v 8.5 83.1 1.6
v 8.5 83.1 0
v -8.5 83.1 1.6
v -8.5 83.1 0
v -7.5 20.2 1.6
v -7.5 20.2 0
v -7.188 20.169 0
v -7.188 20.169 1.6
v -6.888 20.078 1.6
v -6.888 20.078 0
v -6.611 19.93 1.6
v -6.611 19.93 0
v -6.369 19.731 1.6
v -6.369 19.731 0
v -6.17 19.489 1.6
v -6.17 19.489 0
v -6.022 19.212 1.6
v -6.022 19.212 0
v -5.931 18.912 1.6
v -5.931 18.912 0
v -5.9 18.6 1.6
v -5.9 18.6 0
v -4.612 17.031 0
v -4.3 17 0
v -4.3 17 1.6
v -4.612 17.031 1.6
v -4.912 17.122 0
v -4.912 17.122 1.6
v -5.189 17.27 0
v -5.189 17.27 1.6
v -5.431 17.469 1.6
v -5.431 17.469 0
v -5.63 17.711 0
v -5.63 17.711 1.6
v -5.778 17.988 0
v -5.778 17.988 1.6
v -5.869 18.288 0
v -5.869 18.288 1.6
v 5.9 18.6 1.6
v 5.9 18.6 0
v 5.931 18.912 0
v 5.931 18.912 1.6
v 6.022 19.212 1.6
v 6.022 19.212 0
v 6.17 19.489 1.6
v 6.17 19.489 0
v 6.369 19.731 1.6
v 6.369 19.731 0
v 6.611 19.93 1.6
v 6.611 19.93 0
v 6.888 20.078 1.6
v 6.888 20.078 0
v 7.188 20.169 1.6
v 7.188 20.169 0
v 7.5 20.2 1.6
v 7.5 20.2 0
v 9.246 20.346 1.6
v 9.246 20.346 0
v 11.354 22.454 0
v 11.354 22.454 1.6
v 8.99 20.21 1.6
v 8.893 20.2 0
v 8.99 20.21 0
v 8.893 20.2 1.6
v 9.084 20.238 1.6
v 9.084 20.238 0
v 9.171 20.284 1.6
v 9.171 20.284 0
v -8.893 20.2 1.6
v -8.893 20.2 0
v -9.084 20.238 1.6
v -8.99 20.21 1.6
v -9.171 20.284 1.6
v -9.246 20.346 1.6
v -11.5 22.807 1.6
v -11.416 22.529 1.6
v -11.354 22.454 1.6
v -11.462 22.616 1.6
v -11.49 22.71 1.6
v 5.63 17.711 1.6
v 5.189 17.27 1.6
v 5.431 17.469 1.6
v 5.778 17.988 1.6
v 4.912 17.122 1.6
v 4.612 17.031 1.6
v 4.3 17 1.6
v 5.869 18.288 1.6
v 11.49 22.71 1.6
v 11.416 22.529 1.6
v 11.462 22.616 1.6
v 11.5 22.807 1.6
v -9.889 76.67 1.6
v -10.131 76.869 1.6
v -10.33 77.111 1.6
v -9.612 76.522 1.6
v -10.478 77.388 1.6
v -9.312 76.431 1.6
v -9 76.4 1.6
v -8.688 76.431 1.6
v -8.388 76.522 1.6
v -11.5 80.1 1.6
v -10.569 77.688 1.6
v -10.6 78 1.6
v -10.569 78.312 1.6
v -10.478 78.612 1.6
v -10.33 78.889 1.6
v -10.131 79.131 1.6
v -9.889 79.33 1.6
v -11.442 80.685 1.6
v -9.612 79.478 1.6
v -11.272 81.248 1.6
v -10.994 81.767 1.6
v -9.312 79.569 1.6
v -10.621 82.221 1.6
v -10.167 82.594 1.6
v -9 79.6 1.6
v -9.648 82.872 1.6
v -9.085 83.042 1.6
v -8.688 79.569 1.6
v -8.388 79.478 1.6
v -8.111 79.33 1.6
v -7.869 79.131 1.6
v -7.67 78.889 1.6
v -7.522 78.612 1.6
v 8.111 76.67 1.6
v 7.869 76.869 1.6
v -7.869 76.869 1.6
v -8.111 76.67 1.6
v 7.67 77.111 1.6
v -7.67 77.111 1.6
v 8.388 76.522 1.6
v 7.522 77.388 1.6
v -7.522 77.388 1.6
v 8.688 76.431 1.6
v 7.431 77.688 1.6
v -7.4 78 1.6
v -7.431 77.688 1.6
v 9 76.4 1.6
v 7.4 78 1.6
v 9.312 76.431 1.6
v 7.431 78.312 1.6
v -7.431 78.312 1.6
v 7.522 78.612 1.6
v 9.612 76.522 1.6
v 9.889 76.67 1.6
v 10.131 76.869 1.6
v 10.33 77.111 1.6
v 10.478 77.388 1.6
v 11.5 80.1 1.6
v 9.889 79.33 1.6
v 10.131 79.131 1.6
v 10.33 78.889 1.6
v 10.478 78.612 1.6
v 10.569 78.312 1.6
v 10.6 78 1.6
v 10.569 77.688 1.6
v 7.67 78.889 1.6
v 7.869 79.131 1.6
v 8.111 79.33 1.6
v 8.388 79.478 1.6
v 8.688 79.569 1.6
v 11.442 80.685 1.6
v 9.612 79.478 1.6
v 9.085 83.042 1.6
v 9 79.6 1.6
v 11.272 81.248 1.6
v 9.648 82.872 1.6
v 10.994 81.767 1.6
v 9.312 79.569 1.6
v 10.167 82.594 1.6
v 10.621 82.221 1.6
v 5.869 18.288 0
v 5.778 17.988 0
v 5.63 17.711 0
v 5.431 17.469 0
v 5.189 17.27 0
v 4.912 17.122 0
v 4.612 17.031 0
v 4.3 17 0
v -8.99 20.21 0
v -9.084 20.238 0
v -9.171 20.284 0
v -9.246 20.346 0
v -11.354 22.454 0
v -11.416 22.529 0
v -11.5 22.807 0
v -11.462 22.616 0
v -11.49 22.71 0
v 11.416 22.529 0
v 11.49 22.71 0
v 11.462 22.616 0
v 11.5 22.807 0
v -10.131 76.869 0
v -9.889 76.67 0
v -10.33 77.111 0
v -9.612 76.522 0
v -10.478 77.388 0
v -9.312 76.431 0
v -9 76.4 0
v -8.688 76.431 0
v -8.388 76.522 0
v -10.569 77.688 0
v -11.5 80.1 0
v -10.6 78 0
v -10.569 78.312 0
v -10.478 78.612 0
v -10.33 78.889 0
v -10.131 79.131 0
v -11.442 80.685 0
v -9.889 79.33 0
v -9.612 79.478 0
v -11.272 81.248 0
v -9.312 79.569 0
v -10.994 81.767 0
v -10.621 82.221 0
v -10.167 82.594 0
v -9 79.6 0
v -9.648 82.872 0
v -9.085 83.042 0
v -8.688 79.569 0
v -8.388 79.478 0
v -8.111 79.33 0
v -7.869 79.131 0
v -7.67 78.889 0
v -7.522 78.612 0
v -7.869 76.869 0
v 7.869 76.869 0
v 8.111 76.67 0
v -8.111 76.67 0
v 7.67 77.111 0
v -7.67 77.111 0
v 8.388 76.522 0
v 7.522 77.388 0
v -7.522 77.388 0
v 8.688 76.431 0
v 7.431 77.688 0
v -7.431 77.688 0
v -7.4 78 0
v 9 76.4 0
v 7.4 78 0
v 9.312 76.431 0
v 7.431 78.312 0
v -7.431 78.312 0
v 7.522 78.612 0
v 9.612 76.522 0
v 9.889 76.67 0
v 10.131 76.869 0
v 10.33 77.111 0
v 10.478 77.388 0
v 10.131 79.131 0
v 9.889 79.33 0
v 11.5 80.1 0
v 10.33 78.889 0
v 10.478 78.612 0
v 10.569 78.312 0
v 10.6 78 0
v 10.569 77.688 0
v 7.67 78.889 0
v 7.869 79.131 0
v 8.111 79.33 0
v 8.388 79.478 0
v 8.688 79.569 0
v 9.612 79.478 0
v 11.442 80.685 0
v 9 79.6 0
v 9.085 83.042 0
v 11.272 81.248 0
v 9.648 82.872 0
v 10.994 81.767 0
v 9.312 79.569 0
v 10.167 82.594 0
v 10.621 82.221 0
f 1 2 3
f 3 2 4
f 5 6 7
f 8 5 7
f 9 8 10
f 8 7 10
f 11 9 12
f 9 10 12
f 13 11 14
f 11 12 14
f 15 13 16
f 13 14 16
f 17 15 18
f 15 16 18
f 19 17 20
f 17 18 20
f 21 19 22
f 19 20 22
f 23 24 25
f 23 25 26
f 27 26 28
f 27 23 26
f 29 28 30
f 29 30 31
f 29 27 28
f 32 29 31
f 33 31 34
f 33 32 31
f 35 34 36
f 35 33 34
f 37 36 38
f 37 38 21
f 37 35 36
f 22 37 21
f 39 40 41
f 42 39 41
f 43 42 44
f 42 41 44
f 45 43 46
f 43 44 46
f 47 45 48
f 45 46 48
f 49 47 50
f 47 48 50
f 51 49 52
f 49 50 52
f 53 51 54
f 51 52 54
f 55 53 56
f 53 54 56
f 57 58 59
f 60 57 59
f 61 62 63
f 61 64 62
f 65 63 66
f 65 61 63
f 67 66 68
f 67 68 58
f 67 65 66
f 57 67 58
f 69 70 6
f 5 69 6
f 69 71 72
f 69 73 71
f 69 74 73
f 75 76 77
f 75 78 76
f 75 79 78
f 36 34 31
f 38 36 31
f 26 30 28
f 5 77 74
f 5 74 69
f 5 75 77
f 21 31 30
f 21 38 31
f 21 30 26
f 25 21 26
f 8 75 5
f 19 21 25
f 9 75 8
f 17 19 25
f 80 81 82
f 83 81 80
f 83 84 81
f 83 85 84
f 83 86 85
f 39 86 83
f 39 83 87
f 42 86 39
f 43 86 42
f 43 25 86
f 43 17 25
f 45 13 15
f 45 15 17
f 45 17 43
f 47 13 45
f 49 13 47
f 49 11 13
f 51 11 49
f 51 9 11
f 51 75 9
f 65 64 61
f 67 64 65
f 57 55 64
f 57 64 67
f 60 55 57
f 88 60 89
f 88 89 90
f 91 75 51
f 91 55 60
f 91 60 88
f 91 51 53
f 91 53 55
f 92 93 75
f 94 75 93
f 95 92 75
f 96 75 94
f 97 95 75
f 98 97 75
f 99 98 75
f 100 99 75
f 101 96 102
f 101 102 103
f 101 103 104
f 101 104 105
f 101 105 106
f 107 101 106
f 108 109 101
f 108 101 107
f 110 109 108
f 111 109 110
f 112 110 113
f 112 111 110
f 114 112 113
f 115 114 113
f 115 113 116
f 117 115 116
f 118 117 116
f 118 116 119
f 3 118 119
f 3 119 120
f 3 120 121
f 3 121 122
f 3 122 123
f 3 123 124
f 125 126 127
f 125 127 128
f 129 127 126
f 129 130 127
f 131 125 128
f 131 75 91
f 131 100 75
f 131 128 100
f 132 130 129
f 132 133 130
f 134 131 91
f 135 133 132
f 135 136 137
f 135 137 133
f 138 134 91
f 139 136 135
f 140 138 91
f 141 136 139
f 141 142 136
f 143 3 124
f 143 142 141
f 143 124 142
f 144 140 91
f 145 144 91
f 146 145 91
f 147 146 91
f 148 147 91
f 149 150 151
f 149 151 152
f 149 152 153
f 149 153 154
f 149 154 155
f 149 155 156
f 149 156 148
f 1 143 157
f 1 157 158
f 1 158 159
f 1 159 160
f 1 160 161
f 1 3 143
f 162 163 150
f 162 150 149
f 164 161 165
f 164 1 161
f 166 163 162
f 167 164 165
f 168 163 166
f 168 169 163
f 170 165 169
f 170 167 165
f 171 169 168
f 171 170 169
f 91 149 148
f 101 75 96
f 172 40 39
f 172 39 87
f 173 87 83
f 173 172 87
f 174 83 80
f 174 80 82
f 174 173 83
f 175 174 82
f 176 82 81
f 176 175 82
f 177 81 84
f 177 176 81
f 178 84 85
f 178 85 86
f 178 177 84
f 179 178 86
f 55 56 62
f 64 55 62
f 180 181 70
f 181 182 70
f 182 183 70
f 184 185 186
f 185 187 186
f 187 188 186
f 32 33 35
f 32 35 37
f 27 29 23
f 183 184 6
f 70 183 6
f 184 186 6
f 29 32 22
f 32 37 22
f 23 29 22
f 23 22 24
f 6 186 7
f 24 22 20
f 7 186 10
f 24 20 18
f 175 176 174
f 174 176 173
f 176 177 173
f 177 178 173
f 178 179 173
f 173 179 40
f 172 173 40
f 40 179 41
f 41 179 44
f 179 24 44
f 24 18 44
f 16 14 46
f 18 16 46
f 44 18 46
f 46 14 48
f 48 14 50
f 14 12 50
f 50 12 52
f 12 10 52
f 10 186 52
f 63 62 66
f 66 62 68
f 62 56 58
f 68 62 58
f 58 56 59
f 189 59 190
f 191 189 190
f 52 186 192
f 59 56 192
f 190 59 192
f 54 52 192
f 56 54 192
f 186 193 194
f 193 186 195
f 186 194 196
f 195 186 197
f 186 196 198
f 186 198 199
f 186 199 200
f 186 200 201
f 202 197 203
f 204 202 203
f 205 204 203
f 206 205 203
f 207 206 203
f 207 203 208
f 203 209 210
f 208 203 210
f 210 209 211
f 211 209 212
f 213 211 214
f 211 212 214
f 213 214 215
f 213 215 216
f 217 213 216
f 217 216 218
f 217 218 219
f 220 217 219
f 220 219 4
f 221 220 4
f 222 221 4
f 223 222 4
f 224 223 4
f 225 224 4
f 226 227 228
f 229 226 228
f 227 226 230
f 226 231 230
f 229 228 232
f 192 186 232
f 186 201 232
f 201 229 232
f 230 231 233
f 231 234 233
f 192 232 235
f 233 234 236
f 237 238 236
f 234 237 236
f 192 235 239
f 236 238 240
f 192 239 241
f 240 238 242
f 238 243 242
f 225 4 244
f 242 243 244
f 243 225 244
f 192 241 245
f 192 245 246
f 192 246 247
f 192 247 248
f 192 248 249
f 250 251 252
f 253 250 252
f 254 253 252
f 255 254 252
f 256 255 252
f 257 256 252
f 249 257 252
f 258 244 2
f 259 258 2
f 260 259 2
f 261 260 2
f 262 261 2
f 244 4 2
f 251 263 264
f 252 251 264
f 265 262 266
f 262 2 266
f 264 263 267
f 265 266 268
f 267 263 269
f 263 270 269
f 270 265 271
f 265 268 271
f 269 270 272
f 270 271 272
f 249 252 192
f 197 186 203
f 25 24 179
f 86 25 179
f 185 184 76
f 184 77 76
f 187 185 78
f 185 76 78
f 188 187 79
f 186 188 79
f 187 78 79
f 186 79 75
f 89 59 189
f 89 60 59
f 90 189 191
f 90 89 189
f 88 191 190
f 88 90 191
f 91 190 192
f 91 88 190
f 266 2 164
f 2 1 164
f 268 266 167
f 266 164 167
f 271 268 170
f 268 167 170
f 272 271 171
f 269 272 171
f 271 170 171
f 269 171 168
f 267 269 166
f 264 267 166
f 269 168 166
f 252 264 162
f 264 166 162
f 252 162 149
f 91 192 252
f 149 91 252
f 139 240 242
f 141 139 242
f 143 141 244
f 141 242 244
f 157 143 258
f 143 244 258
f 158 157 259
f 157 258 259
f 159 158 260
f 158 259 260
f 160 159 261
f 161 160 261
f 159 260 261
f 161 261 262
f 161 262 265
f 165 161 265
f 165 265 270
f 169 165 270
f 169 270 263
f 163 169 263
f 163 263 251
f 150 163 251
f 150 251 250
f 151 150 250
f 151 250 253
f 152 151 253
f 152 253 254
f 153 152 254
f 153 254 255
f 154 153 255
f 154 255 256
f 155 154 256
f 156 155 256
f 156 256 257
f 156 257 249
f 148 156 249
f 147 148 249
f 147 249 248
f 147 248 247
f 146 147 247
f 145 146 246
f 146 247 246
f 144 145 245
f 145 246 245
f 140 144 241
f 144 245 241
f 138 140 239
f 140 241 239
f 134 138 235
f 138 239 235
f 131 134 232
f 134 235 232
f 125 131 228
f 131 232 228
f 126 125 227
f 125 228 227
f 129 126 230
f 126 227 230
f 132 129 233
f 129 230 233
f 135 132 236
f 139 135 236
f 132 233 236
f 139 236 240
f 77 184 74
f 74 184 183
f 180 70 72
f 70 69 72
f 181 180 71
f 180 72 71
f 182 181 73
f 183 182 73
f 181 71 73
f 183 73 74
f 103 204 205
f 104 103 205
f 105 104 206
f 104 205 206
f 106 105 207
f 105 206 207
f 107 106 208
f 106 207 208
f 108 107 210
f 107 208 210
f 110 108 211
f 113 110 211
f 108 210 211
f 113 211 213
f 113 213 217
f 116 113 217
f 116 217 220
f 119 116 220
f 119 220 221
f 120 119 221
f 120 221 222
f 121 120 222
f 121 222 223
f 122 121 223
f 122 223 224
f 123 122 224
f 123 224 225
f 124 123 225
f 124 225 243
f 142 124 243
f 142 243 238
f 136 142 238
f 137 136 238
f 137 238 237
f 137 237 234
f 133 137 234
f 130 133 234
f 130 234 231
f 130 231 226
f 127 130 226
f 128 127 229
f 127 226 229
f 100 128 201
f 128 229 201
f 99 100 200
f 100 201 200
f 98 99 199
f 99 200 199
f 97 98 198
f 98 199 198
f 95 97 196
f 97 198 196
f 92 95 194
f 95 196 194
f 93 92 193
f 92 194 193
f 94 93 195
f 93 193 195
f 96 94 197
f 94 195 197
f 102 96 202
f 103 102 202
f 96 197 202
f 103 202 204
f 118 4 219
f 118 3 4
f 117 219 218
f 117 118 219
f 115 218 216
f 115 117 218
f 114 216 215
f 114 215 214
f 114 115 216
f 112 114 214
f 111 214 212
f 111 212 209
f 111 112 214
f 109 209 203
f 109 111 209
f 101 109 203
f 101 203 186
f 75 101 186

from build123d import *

# Parameters (mm, degrees)
BOSS_EXTRUDE1_DEPTH  = 1.6
FILLET1_R            = 3
FILLET2_START        = -1
FILLET2_DEPTH        = 4
FILLET2_2_DEPTH      = 1.6
FILLET3_R            = 0.5
M3_CLEARANCE_HOLE1_D = 3.2


with BuildPart() as part:
    # Sketch1 → Boss-Extrude1 (new body)
    with BuildSketch(Plane.XY):
        Polygon((11.5, 83.1), (-11.5, 83.1), (-11.5, 22.6), (-9.1, 20.2), (-5.9, 20.2), (-5.9, 17), (5.9, 17), (5.9, 20.2), (9.1, 20.2), (11.5, 22.6), align=None)
    extrude(amount=BOSS_EXTRUDE1_DEPTH)

    # Fillet1
    fillet1_edges = [part.edges().sort_by_distance(p)[0] for p in [
        (-11.5, 83.1, 0.8),
        (11.5, 83.1, 0.8),
    ]]
    fillet(fillet1_edges, radius=FILLET1_R)

    # Fillet2: read off the stored shape, not the designer's step
    # Fillet2 outline → Fillet2 (cut)
    with BuildSketch(Plane.XY.offset(FILLET2_START)):
        with BuildLine():
            ThreePointArc((5.9, 18.6), (5.43137085, 17.46862915), (4.3, 17))
            Line((4.3, 17), (5.9, 17))
            Line((5.9, 17), (5.9, 18.6))
        make_face()
        with BuildLine():
            ThreePointArc((-4.3, 17), (-5.43137085, 17.46862915), (-5.9, 18.6))
            Line((-5.9, 18.6), (-5.9, 17))
            Line((-5.9, 17), (-4.3, 17))
        make_face()
    extrude(amount=FILLET2_DEPTH, mode=Mode.SUBTRACT)

    # Fillet2 2 outline → Fillet2 2 (add)
    with BuildSketch(Plane.XY):
        with BuildLine():
            Line((5.9, 20.2), (5.9, 18.6))
            ThreePointArc((5.9, 18.6), (6.36862915, 19.73137085), (7.5, 20.2))
            Line((7.5, 20.2), (5.9, 20.2))
        make_face()
        with BuildLine():
            ThreePointArc((-7.5, 20.2), (-6.36862915, 19.73137085), (-5.9, 18.6))
            Line((-5.9, 18.6), (-5.9, 20.2))
            Line((-5.9, 20.2), (-7.5, 20.2))
        make_face()
    extrude(amount=FILLET2_2_DEPTH)

    # Fillet3
    fillet3_edges = [part.edges().sort_by_distance(p)[0] for p in [
        (-11.5, 22.6, 0.8),
        (11.5, 22.6, 0.8),
        (9.1, 20.2, 0.8),
        (-9.1, 20.2, 0.8),
    ]]
    fillet(fillet3_edges, radius=FILLET3_R)

    # M3 Clearance Hole1 (through all)
    with Locations(Plane.XY.offset(1.6)):
        with Locations((-9, 78), (9, 78)):
            Hole(M3_CLEARANCE_HOLE1_D / 2)


solid = part.part
